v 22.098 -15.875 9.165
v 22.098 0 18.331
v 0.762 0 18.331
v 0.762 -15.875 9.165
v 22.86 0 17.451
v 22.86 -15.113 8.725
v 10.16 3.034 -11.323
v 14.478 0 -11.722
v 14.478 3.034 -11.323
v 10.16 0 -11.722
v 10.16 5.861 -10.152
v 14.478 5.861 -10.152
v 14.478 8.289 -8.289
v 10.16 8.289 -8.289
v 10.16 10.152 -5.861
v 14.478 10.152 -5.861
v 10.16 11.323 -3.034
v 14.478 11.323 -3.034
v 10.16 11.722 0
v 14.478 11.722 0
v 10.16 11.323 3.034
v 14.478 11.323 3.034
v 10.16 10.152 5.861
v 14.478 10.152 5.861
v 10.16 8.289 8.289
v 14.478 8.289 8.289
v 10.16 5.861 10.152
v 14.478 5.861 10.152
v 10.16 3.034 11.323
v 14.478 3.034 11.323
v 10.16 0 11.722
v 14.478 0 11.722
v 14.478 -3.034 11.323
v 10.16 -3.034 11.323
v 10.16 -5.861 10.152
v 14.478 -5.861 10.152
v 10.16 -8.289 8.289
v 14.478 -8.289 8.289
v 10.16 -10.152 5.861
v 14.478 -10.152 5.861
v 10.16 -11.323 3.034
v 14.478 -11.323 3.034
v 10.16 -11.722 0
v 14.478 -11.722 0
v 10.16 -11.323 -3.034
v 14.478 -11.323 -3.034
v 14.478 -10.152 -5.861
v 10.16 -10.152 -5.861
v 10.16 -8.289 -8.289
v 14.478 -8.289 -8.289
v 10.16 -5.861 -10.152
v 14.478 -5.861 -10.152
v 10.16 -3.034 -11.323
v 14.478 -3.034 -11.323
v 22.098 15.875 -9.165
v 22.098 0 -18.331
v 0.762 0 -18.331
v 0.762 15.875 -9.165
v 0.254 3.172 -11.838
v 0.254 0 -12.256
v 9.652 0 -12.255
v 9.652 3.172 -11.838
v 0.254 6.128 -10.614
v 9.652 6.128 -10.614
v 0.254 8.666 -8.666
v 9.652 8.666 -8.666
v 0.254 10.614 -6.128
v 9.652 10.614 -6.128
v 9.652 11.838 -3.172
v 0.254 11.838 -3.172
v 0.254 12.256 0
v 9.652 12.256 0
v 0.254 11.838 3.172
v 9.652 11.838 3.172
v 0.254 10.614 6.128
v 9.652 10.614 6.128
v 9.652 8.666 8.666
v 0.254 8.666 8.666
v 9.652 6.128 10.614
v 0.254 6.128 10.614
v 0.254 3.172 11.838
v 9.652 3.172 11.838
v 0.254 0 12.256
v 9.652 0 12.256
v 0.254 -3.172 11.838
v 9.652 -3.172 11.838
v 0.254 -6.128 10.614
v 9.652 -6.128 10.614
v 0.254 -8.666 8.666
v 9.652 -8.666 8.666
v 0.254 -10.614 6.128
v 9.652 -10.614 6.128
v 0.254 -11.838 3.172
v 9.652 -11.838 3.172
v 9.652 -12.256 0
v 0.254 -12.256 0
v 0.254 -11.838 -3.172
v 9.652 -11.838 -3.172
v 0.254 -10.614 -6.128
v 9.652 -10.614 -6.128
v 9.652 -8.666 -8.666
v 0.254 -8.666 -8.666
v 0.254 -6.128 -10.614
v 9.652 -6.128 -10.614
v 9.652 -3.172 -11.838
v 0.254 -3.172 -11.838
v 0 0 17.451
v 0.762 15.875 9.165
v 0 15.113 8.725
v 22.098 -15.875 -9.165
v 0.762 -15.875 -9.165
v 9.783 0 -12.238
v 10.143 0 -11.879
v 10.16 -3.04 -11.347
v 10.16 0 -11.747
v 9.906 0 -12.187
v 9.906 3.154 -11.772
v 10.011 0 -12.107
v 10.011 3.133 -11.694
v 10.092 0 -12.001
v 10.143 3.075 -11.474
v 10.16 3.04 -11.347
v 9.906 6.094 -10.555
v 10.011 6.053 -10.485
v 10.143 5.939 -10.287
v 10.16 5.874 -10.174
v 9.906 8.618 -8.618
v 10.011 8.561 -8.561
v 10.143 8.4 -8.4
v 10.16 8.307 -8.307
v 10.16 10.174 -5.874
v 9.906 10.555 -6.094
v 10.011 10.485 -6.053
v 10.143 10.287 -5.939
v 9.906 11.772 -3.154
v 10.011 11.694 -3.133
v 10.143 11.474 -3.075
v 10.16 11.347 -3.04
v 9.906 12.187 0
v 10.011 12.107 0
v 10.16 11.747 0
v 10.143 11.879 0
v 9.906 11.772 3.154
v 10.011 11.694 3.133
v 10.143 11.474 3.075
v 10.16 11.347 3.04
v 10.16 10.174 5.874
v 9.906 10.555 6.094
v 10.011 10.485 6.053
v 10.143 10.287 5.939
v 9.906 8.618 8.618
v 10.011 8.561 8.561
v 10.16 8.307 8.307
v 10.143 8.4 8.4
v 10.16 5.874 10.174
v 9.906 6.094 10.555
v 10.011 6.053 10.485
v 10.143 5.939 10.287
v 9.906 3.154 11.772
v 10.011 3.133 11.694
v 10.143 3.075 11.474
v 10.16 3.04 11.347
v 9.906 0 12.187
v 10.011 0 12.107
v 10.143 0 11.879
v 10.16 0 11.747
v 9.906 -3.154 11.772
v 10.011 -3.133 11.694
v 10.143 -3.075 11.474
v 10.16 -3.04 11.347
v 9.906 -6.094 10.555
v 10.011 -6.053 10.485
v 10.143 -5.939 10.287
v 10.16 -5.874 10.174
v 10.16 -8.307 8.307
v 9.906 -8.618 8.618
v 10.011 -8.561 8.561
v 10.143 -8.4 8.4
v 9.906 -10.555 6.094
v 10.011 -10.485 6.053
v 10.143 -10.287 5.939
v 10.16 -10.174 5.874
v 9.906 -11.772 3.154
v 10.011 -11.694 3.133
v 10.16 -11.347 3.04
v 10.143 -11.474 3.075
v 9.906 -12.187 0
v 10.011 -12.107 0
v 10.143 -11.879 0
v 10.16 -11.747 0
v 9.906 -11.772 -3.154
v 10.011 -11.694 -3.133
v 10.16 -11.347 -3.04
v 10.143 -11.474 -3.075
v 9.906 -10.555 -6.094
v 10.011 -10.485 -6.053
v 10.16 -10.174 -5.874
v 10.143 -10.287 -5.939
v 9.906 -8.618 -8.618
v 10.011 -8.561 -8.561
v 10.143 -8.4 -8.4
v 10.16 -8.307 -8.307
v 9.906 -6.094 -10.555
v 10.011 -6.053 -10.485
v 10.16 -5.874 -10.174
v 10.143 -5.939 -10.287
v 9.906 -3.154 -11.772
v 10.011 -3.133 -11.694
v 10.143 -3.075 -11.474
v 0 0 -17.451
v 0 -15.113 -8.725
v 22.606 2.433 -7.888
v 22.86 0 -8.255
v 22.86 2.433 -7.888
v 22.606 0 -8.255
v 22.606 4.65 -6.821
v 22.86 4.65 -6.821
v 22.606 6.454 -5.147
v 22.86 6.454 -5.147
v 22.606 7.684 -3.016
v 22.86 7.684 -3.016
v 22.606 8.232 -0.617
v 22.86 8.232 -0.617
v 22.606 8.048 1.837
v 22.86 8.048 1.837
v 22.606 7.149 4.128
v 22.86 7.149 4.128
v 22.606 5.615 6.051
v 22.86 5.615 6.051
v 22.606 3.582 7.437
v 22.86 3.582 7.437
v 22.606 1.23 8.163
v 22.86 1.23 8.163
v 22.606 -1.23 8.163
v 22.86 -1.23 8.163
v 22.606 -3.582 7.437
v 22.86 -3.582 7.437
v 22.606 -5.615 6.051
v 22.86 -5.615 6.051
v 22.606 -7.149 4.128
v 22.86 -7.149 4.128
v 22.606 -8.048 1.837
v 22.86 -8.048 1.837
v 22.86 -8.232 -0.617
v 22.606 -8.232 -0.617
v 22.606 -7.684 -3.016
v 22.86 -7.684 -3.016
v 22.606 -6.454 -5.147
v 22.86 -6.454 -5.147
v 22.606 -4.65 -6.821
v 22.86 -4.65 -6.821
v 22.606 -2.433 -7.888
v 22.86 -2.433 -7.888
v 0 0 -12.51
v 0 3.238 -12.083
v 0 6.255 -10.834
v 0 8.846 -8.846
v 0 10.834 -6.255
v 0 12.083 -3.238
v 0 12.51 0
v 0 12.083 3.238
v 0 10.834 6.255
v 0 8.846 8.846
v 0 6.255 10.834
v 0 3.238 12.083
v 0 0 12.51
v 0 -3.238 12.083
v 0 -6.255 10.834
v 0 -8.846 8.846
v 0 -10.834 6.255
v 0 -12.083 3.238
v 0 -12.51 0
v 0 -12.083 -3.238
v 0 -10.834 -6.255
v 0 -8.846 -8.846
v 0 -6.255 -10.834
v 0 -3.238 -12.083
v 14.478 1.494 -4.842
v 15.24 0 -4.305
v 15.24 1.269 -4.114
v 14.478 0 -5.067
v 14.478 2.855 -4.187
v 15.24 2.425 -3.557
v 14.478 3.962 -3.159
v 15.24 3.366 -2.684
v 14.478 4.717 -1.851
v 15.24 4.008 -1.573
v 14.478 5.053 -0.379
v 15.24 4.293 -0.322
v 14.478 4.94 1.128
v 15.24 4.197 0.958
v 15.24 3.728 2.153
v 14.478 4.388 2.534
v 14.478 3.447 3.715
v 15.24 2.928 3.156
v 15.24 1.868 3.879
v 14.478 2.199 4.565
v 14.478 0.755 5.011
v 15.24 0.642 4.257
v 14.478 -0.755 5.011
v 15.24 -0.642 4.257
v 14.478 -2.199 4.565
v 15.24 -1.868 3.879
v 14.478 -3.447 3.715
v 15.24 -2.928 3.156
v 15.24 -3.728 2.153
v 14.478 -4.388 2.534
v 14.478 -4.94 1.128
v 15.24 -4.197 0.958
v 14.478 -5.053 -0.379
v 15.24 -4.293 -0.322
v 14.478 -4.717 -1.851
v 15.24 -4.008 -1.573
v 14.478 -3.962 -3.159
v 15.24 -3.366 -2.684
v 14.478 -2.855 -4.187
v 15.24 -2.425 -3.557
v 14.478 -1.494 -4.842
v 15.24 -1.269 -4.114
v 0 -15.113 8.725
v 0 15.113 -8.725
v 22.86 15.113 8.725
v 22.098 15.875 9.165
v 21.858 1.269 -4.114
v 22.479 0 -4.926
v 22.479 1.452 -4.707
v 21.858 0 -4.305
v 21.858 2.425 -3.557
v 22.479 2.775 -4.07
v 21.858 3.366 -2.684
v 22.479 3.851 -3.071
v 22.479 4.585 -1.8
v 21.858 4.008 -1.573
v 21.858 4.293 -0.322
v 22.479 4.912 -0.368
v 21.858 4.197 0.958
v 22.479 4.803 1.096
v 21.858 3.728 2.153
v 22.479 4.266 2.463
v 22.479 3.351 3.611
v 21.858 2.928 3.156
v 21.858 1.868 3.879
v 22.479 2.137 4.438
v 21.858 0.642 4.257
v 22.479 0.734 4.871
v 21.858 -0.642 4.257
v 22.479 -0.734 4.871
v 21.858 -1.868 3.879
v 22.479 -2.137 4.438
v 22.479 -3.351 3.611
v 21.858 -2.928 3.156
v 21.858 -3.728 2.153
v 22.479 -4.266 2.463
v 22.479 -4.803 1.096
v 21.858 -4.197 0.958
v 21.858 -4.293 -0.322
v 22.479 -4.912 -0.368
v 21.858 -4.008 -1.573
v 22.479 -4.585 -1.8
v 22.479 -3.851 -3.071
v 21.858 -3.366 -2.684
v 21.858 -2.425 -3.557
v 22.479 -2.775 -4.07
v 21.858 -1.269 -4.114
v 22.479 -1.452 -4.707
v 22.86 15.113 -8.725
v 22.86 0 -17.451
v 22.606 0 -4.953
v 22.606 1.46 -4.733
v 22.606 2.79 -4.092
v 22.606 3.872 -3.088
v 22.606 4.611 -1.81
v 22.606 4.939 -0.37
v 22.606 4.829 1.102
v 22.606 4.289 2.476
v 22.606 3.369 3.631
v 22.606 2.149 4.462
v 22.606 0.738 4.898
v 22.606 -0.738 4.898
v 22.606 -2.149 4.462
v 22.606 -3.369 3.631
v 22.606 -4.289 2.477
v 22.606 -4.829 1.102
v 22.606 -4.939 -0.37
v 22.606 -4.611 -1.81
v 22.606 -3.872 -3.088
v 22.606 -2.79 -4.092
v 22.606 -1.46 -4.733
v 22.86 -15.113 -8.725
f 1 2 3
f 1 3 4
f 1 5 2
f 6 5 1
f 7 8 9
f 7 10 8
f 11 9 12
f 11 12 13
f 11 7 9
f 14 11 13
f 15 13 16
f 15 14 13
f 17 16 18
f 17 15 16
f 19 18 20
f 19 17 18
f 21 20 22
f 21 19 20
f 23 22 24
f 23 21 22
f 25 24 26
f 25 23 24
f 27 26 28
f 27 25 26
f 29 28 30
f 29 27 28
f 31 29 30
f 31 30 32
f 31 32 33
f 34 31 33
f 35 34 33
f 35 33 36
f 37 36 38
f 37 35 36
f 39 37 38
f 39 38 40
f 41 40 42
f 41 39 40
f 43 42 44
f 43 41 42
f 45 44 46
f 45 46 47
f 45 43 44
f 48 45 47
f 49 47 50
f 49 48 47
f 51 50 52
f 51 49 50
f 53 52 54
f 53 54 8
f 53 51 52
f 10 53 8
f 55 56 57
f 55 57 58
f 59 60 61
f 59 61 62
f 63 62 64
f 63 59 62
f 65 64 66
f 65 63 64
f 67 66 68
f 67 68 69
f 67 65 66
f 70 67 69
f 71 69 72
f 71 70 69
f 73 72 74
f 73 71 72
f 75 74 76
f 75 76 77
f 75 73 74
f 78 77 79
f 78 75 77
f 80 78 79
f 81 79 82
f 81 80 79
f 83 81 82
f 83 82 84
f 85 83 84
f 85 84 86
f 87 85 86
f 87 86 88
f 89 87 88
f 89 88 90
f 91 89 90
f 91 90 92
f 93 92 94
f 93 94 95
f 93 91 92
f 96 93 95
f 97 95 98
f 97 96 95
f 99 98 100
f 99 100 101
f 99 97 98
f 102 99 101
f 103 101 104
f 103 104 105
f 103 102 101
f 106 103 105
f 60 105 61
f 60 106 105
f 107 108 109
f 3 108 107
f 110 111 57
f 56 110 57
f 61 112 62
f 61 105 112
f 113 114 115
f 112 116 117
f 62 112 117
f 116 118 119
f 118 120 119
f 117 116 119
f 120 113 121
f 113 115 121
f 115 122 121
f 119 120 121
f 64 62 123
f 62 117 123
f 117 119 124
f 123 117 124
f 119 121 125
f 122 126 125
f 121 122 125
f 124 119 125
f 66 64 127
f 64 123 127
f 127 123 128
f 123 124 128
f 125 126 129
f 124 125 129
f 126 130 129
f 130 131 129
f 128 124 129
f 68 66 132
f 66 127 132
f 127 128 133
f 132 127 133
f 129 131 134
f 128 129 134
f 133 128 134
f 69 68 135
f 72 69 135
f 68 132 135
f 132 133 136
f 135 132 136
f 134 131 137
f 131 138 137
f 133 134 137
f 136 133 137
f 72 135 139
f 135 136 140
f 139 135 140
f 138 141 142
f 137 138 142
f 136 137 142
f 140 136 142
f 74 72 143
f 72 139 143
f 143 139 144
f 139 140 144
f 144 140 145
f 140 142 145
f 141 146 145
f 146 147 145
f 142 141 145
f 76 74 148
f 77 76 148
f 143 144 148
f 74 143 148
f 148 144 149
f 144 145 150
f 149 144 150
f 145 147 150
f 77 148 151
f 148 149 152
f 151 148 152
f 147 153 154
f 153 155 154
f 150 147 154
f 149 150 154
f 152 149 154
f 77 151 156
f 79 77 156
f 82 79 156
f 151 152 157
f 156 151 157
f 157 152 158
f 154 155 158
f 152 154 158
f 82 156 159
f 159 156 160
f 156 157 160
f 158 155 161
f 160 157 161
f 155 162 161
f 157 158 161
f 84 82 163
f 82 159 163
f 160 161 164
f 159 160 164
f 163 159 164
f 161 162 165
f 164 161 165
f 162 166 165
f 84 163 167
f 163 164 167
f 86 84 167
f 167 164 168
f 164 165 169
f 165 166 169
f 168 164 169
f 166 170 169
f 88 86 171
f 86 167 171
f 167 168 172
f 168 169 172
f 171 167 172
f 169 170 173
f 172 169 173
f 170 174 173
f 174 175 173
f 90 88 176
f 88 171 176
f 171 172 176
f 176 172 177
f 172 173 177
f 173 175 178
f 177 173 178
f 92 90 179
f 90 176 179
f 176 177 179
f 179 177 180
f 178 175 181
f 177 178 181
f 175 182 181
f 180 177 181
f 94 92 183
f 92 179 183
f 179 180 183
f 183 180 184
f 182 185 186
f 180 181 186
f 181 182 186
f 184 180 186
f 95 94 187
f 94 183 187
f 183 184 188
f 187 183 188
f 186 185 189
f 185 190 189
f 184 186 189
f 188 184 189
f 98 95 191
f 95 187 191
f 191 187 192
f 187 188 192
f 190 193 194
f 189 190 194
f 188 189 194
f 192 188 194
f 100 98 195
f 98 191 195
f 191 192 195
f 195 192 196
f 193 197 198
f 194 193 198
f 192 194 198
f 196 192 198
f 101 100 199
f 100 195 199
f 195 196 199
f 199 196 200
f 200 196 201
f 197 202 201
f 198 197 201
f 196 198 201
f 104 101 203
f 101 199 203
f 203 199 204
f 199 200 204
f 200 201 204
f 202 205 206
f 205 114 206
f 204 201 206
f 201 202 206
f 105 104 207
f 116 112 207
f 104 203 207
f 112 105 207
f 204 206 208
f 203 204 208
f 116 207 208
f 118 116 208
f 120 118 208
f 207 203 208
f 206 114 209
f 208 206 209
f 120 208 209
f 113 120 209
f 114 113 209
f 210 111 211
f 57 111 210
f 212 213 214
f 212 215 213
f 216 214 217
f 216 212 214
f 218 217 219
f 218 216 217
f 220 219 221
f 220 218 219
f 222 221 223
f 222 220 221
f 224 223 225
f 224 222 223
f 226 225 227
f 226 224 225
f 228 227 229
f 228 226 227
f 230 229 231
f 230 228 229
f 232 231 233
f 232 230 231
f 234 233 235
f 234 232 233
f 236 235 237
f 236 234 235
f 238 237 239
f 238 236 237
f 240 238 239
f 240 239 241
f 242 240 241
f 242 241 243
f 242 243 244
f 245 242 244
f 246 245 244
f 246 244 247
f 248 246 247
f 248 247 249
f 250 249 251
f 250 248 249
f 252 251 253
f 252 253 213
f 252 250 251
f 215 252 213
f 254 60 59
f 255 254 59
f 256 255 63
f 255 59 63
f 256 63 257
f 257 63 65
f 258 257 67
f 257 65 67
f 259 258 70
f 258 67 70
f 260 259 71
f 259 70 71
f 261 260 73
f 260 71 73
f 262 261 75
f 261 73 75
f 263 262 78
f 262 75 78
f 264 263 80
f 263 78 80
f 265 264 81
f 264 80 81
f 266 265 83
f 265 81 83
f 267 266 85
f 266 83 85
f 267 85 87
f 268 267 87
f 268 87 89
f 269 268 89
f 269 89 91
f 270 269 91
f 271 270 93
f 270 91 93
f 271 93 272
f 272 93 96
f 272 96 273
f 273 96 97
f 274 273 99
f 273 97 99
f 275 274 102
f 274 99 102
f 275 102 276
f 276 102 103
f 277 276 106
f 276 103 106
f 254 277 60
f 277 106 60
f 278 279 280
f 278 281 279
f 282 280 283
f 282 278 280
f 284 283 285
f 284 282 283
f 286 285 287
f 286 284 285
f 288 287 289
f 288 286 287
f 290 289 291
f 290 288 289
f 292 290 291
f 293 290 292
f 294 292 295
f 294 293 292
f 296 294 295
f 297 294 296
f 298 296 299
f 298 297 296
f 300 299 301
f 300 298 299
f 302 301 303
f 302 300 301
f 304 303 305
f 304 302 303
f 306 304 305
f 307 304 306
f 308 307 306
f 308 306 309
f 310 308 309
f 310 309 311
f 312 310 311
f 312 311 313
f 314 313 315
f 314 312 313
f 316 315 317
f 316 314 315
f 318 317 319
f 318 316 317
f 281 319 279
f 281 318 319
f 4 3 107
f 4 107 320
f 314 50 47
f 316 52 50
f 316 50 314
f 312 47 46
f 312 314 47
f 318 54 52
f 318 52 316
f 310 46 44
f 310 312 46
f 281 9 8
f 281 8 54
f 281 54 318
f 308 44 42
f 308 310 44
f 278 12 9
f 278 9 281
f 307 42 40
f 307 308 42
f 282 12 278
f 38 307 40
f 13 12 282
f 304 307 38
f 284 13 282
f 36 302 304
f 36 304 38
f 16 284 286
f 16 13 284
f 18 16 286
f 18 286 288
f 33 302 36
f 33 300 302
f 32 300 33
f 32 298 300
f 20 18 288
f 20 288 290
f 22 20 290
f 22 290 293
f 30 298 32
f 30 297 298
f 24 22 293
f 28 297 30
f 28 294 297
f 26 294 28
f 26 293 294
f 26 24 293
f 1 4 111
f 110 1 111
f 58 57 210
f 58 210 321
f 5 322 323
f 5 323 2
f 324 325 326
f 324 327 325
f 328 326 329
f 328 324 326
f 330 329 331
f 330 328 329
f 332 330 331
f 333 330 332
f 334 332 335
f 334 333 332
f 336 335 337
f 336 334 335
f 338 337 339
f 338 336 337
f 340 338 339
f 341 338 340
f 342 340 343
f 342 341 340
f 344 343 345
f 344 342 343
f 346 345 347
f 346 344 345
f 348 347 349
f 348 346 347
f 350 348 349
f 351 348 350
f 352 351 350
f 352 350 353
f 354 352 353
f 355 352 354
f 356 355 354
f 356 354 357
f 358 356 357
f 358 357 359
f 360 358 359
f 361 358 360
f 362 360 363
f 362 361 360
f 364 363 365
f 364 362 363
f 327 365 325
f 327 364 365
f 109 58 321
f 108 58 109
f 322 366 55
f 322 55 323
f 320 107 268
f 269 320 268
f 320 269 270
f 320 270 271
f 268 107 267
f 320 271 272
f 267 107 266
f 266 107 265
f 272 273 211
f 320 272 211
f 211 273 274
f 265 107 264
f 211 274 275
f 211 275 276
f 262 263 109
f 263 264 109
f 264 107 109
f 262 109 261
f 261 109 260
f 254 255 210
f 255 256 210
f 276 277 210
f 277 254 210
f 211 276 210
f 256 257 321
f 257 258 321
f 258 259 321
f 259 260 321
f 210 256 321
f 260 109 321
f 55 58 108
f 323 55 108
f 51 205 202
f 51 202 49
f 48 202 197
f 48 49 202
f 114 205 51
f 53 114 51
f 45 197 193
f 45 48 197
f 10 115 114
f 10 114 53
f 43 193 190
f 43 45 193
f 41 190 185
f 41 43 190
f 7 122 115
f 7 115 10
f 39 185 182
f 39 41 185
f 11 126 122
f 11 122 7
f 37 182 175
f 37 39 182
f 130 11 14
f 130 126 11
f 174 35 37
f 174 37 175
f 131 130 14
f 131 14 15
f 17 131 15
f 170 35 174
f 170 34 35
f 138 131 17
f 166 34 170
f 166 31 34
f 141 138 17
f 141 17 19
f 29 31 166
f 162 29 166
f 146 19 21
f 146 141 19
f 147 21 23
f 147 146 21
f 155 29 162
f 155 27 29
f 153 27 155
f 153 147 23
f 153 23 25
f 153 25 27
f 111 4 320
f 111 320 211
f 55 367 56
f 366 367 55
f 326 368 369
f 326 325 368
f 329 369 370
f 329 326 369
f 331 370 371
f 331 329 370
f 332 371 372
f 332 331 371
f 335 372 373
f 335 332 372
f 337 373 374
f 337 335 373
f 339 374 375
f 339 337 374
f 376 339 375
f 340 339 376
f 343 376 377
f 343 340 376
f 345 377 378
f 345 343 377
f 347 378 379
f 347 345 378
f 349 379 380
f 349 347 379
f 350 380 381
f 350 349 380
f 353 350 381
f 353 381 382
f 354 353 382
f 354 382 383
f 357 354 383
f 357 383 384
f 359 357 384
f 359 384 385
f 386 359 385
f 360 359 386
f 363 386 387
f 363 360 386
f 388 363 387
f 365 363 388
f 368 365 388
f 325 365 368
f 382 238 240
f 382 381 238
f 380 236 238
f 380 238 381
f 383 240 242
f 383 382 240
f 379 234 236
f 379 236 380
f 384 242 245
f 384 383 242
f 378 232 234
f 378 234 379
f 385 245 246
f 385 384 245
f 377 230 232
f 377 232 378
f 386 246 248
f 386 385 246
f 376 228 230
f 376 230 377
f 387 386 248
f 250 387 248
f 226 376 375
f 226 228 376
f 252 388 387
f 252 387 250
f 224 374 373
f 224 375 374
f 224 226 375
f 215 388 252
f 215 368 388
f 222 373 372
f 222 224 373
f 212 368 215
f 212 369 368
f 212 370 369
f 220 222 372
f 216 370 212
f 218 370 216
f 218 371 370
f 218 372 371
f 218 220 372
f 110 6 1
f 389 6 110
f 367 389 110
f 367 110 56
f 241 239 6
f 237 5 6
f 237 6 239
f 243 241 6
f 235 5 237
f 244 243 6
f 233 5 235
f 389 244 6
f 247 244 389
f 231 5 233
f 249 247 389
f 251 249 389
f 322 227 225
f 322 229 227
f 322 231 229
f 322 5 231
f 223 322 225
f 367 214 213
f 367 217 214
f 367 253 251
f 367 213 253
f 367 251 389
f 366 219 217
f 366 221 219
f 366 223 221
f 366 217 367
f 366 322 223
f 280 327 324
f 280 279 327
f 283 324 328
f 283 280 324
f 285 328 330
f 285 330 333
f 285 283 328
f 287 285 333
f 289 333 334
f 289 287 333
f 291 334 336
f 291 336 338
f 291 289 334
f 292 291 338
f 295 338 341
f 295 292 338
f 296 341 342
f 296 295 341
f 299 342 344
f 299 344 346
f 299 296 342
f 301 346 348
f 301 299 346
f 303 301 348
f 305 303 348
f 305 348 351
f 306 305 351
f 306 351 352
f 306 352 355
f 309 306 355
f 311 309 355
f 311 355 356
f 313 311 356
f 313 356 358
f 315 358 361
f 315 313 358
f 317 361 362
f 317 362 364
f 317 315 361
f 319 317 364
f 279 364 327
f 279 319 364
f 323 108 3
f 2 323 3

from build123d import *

# Parameters (mm, degrees)
EXTRUDE1_DEPTH = 22.86
CHAMFER1_SIZE  = 0.254
CHAMFER3_SIZE  = 0.762
CHAMFER4_SIZE  = 0.762
FILLET1_R      = 0.508


with BuildPart() as part:
    # Sketch1 → Extrude1 (new body)
    with BuildSketch(Plane(origin=(0, 0, 0), x_dir=(0, 0, -1), z_dir=(1, 0, 0))):
        Polygon((9.165435523, 15.875), (-9.165435523, 15.875), (-18.330871047, 0), (-9.165435523, -15.875), (9.165435523, -15.875), (18.330871047, 0), align=None)
    extrude(amount=EXTRUDE1_DEPTH)

    # Sketch2 → Cut-Revolve1 (revolve, cut)
    with BuildSketch(Plane.XY, mode=Mode.PRIVATE) as cut_revolve1_sk:
        Polygon((0, 12.2555), (0, 0), (22.86, 0), (22.86, 8.255), (22.606, 8.255), (22.606, 4.953), (22.479, 4.926005317), (21.858294683, 4.3053), (15.24, 4.3053), (14.478, 5.0673), (14.478, 11.7221), (10.16, 11.7221), (10.16, 12.2555), align=None)
    revolve(cut_revolve1_sk.sketch.rotate(Axis((0, 0, 0), (1, 0, 0)), 270), axis=Axis((0, 0, 0), (1, 0, 0)), mode=Mode.SUBTRACT)  # turned: the seam where the file's is

    # Chamfer1
    chamfer1_edges = [part.edges().sort_by_distance(p)[0] for p in [
        (0, 0, 12.2555),
    ]]
    chamfer(chamfer1_edges, length=CHAMFER1_SIZE)

    # Chamfer3
    chamfer3_edges = [part.edges().sort_by_distance(p)[0] for p in [
        (0, -7.9375, -13.748153285),
        (0, -15.875, 0),
        (0, -7.9375, 13.748153285),
        (0, 7.9375, 13.748153285),
        (0, 15.875, 0),
        (0, 7.9375, -13.748153285),
    ]]
    chamfer(chamfer3_edges, length=CHAMFER3_SIZE)

    # Chamfer4
    chamfer4_edges = [part.edges().sort_by_distance(p)[0] for p in [
        (22.86, 7.9375, 13.748153285),
        (22.86, -7.9375, 13.748153285),
        (22.86, -15.875, 0),
        (22.86, -7.9375, -13.748153285),
        (22.86, 7.9375, -13.748153285),
        (22.86, 15.875, 0),
    ]]
    chamfer(chamfer4_edges, length=CHAMFER4_SIZE)

    # Fillet1
    fillet1_edges = [part.edges().sort_by_distance(p)[0] for p in [
        (10.16, 0, 12.2555),
    ]]
    fillet(fillet1_edges, radius=FILLET1_R)


solid = part.part
